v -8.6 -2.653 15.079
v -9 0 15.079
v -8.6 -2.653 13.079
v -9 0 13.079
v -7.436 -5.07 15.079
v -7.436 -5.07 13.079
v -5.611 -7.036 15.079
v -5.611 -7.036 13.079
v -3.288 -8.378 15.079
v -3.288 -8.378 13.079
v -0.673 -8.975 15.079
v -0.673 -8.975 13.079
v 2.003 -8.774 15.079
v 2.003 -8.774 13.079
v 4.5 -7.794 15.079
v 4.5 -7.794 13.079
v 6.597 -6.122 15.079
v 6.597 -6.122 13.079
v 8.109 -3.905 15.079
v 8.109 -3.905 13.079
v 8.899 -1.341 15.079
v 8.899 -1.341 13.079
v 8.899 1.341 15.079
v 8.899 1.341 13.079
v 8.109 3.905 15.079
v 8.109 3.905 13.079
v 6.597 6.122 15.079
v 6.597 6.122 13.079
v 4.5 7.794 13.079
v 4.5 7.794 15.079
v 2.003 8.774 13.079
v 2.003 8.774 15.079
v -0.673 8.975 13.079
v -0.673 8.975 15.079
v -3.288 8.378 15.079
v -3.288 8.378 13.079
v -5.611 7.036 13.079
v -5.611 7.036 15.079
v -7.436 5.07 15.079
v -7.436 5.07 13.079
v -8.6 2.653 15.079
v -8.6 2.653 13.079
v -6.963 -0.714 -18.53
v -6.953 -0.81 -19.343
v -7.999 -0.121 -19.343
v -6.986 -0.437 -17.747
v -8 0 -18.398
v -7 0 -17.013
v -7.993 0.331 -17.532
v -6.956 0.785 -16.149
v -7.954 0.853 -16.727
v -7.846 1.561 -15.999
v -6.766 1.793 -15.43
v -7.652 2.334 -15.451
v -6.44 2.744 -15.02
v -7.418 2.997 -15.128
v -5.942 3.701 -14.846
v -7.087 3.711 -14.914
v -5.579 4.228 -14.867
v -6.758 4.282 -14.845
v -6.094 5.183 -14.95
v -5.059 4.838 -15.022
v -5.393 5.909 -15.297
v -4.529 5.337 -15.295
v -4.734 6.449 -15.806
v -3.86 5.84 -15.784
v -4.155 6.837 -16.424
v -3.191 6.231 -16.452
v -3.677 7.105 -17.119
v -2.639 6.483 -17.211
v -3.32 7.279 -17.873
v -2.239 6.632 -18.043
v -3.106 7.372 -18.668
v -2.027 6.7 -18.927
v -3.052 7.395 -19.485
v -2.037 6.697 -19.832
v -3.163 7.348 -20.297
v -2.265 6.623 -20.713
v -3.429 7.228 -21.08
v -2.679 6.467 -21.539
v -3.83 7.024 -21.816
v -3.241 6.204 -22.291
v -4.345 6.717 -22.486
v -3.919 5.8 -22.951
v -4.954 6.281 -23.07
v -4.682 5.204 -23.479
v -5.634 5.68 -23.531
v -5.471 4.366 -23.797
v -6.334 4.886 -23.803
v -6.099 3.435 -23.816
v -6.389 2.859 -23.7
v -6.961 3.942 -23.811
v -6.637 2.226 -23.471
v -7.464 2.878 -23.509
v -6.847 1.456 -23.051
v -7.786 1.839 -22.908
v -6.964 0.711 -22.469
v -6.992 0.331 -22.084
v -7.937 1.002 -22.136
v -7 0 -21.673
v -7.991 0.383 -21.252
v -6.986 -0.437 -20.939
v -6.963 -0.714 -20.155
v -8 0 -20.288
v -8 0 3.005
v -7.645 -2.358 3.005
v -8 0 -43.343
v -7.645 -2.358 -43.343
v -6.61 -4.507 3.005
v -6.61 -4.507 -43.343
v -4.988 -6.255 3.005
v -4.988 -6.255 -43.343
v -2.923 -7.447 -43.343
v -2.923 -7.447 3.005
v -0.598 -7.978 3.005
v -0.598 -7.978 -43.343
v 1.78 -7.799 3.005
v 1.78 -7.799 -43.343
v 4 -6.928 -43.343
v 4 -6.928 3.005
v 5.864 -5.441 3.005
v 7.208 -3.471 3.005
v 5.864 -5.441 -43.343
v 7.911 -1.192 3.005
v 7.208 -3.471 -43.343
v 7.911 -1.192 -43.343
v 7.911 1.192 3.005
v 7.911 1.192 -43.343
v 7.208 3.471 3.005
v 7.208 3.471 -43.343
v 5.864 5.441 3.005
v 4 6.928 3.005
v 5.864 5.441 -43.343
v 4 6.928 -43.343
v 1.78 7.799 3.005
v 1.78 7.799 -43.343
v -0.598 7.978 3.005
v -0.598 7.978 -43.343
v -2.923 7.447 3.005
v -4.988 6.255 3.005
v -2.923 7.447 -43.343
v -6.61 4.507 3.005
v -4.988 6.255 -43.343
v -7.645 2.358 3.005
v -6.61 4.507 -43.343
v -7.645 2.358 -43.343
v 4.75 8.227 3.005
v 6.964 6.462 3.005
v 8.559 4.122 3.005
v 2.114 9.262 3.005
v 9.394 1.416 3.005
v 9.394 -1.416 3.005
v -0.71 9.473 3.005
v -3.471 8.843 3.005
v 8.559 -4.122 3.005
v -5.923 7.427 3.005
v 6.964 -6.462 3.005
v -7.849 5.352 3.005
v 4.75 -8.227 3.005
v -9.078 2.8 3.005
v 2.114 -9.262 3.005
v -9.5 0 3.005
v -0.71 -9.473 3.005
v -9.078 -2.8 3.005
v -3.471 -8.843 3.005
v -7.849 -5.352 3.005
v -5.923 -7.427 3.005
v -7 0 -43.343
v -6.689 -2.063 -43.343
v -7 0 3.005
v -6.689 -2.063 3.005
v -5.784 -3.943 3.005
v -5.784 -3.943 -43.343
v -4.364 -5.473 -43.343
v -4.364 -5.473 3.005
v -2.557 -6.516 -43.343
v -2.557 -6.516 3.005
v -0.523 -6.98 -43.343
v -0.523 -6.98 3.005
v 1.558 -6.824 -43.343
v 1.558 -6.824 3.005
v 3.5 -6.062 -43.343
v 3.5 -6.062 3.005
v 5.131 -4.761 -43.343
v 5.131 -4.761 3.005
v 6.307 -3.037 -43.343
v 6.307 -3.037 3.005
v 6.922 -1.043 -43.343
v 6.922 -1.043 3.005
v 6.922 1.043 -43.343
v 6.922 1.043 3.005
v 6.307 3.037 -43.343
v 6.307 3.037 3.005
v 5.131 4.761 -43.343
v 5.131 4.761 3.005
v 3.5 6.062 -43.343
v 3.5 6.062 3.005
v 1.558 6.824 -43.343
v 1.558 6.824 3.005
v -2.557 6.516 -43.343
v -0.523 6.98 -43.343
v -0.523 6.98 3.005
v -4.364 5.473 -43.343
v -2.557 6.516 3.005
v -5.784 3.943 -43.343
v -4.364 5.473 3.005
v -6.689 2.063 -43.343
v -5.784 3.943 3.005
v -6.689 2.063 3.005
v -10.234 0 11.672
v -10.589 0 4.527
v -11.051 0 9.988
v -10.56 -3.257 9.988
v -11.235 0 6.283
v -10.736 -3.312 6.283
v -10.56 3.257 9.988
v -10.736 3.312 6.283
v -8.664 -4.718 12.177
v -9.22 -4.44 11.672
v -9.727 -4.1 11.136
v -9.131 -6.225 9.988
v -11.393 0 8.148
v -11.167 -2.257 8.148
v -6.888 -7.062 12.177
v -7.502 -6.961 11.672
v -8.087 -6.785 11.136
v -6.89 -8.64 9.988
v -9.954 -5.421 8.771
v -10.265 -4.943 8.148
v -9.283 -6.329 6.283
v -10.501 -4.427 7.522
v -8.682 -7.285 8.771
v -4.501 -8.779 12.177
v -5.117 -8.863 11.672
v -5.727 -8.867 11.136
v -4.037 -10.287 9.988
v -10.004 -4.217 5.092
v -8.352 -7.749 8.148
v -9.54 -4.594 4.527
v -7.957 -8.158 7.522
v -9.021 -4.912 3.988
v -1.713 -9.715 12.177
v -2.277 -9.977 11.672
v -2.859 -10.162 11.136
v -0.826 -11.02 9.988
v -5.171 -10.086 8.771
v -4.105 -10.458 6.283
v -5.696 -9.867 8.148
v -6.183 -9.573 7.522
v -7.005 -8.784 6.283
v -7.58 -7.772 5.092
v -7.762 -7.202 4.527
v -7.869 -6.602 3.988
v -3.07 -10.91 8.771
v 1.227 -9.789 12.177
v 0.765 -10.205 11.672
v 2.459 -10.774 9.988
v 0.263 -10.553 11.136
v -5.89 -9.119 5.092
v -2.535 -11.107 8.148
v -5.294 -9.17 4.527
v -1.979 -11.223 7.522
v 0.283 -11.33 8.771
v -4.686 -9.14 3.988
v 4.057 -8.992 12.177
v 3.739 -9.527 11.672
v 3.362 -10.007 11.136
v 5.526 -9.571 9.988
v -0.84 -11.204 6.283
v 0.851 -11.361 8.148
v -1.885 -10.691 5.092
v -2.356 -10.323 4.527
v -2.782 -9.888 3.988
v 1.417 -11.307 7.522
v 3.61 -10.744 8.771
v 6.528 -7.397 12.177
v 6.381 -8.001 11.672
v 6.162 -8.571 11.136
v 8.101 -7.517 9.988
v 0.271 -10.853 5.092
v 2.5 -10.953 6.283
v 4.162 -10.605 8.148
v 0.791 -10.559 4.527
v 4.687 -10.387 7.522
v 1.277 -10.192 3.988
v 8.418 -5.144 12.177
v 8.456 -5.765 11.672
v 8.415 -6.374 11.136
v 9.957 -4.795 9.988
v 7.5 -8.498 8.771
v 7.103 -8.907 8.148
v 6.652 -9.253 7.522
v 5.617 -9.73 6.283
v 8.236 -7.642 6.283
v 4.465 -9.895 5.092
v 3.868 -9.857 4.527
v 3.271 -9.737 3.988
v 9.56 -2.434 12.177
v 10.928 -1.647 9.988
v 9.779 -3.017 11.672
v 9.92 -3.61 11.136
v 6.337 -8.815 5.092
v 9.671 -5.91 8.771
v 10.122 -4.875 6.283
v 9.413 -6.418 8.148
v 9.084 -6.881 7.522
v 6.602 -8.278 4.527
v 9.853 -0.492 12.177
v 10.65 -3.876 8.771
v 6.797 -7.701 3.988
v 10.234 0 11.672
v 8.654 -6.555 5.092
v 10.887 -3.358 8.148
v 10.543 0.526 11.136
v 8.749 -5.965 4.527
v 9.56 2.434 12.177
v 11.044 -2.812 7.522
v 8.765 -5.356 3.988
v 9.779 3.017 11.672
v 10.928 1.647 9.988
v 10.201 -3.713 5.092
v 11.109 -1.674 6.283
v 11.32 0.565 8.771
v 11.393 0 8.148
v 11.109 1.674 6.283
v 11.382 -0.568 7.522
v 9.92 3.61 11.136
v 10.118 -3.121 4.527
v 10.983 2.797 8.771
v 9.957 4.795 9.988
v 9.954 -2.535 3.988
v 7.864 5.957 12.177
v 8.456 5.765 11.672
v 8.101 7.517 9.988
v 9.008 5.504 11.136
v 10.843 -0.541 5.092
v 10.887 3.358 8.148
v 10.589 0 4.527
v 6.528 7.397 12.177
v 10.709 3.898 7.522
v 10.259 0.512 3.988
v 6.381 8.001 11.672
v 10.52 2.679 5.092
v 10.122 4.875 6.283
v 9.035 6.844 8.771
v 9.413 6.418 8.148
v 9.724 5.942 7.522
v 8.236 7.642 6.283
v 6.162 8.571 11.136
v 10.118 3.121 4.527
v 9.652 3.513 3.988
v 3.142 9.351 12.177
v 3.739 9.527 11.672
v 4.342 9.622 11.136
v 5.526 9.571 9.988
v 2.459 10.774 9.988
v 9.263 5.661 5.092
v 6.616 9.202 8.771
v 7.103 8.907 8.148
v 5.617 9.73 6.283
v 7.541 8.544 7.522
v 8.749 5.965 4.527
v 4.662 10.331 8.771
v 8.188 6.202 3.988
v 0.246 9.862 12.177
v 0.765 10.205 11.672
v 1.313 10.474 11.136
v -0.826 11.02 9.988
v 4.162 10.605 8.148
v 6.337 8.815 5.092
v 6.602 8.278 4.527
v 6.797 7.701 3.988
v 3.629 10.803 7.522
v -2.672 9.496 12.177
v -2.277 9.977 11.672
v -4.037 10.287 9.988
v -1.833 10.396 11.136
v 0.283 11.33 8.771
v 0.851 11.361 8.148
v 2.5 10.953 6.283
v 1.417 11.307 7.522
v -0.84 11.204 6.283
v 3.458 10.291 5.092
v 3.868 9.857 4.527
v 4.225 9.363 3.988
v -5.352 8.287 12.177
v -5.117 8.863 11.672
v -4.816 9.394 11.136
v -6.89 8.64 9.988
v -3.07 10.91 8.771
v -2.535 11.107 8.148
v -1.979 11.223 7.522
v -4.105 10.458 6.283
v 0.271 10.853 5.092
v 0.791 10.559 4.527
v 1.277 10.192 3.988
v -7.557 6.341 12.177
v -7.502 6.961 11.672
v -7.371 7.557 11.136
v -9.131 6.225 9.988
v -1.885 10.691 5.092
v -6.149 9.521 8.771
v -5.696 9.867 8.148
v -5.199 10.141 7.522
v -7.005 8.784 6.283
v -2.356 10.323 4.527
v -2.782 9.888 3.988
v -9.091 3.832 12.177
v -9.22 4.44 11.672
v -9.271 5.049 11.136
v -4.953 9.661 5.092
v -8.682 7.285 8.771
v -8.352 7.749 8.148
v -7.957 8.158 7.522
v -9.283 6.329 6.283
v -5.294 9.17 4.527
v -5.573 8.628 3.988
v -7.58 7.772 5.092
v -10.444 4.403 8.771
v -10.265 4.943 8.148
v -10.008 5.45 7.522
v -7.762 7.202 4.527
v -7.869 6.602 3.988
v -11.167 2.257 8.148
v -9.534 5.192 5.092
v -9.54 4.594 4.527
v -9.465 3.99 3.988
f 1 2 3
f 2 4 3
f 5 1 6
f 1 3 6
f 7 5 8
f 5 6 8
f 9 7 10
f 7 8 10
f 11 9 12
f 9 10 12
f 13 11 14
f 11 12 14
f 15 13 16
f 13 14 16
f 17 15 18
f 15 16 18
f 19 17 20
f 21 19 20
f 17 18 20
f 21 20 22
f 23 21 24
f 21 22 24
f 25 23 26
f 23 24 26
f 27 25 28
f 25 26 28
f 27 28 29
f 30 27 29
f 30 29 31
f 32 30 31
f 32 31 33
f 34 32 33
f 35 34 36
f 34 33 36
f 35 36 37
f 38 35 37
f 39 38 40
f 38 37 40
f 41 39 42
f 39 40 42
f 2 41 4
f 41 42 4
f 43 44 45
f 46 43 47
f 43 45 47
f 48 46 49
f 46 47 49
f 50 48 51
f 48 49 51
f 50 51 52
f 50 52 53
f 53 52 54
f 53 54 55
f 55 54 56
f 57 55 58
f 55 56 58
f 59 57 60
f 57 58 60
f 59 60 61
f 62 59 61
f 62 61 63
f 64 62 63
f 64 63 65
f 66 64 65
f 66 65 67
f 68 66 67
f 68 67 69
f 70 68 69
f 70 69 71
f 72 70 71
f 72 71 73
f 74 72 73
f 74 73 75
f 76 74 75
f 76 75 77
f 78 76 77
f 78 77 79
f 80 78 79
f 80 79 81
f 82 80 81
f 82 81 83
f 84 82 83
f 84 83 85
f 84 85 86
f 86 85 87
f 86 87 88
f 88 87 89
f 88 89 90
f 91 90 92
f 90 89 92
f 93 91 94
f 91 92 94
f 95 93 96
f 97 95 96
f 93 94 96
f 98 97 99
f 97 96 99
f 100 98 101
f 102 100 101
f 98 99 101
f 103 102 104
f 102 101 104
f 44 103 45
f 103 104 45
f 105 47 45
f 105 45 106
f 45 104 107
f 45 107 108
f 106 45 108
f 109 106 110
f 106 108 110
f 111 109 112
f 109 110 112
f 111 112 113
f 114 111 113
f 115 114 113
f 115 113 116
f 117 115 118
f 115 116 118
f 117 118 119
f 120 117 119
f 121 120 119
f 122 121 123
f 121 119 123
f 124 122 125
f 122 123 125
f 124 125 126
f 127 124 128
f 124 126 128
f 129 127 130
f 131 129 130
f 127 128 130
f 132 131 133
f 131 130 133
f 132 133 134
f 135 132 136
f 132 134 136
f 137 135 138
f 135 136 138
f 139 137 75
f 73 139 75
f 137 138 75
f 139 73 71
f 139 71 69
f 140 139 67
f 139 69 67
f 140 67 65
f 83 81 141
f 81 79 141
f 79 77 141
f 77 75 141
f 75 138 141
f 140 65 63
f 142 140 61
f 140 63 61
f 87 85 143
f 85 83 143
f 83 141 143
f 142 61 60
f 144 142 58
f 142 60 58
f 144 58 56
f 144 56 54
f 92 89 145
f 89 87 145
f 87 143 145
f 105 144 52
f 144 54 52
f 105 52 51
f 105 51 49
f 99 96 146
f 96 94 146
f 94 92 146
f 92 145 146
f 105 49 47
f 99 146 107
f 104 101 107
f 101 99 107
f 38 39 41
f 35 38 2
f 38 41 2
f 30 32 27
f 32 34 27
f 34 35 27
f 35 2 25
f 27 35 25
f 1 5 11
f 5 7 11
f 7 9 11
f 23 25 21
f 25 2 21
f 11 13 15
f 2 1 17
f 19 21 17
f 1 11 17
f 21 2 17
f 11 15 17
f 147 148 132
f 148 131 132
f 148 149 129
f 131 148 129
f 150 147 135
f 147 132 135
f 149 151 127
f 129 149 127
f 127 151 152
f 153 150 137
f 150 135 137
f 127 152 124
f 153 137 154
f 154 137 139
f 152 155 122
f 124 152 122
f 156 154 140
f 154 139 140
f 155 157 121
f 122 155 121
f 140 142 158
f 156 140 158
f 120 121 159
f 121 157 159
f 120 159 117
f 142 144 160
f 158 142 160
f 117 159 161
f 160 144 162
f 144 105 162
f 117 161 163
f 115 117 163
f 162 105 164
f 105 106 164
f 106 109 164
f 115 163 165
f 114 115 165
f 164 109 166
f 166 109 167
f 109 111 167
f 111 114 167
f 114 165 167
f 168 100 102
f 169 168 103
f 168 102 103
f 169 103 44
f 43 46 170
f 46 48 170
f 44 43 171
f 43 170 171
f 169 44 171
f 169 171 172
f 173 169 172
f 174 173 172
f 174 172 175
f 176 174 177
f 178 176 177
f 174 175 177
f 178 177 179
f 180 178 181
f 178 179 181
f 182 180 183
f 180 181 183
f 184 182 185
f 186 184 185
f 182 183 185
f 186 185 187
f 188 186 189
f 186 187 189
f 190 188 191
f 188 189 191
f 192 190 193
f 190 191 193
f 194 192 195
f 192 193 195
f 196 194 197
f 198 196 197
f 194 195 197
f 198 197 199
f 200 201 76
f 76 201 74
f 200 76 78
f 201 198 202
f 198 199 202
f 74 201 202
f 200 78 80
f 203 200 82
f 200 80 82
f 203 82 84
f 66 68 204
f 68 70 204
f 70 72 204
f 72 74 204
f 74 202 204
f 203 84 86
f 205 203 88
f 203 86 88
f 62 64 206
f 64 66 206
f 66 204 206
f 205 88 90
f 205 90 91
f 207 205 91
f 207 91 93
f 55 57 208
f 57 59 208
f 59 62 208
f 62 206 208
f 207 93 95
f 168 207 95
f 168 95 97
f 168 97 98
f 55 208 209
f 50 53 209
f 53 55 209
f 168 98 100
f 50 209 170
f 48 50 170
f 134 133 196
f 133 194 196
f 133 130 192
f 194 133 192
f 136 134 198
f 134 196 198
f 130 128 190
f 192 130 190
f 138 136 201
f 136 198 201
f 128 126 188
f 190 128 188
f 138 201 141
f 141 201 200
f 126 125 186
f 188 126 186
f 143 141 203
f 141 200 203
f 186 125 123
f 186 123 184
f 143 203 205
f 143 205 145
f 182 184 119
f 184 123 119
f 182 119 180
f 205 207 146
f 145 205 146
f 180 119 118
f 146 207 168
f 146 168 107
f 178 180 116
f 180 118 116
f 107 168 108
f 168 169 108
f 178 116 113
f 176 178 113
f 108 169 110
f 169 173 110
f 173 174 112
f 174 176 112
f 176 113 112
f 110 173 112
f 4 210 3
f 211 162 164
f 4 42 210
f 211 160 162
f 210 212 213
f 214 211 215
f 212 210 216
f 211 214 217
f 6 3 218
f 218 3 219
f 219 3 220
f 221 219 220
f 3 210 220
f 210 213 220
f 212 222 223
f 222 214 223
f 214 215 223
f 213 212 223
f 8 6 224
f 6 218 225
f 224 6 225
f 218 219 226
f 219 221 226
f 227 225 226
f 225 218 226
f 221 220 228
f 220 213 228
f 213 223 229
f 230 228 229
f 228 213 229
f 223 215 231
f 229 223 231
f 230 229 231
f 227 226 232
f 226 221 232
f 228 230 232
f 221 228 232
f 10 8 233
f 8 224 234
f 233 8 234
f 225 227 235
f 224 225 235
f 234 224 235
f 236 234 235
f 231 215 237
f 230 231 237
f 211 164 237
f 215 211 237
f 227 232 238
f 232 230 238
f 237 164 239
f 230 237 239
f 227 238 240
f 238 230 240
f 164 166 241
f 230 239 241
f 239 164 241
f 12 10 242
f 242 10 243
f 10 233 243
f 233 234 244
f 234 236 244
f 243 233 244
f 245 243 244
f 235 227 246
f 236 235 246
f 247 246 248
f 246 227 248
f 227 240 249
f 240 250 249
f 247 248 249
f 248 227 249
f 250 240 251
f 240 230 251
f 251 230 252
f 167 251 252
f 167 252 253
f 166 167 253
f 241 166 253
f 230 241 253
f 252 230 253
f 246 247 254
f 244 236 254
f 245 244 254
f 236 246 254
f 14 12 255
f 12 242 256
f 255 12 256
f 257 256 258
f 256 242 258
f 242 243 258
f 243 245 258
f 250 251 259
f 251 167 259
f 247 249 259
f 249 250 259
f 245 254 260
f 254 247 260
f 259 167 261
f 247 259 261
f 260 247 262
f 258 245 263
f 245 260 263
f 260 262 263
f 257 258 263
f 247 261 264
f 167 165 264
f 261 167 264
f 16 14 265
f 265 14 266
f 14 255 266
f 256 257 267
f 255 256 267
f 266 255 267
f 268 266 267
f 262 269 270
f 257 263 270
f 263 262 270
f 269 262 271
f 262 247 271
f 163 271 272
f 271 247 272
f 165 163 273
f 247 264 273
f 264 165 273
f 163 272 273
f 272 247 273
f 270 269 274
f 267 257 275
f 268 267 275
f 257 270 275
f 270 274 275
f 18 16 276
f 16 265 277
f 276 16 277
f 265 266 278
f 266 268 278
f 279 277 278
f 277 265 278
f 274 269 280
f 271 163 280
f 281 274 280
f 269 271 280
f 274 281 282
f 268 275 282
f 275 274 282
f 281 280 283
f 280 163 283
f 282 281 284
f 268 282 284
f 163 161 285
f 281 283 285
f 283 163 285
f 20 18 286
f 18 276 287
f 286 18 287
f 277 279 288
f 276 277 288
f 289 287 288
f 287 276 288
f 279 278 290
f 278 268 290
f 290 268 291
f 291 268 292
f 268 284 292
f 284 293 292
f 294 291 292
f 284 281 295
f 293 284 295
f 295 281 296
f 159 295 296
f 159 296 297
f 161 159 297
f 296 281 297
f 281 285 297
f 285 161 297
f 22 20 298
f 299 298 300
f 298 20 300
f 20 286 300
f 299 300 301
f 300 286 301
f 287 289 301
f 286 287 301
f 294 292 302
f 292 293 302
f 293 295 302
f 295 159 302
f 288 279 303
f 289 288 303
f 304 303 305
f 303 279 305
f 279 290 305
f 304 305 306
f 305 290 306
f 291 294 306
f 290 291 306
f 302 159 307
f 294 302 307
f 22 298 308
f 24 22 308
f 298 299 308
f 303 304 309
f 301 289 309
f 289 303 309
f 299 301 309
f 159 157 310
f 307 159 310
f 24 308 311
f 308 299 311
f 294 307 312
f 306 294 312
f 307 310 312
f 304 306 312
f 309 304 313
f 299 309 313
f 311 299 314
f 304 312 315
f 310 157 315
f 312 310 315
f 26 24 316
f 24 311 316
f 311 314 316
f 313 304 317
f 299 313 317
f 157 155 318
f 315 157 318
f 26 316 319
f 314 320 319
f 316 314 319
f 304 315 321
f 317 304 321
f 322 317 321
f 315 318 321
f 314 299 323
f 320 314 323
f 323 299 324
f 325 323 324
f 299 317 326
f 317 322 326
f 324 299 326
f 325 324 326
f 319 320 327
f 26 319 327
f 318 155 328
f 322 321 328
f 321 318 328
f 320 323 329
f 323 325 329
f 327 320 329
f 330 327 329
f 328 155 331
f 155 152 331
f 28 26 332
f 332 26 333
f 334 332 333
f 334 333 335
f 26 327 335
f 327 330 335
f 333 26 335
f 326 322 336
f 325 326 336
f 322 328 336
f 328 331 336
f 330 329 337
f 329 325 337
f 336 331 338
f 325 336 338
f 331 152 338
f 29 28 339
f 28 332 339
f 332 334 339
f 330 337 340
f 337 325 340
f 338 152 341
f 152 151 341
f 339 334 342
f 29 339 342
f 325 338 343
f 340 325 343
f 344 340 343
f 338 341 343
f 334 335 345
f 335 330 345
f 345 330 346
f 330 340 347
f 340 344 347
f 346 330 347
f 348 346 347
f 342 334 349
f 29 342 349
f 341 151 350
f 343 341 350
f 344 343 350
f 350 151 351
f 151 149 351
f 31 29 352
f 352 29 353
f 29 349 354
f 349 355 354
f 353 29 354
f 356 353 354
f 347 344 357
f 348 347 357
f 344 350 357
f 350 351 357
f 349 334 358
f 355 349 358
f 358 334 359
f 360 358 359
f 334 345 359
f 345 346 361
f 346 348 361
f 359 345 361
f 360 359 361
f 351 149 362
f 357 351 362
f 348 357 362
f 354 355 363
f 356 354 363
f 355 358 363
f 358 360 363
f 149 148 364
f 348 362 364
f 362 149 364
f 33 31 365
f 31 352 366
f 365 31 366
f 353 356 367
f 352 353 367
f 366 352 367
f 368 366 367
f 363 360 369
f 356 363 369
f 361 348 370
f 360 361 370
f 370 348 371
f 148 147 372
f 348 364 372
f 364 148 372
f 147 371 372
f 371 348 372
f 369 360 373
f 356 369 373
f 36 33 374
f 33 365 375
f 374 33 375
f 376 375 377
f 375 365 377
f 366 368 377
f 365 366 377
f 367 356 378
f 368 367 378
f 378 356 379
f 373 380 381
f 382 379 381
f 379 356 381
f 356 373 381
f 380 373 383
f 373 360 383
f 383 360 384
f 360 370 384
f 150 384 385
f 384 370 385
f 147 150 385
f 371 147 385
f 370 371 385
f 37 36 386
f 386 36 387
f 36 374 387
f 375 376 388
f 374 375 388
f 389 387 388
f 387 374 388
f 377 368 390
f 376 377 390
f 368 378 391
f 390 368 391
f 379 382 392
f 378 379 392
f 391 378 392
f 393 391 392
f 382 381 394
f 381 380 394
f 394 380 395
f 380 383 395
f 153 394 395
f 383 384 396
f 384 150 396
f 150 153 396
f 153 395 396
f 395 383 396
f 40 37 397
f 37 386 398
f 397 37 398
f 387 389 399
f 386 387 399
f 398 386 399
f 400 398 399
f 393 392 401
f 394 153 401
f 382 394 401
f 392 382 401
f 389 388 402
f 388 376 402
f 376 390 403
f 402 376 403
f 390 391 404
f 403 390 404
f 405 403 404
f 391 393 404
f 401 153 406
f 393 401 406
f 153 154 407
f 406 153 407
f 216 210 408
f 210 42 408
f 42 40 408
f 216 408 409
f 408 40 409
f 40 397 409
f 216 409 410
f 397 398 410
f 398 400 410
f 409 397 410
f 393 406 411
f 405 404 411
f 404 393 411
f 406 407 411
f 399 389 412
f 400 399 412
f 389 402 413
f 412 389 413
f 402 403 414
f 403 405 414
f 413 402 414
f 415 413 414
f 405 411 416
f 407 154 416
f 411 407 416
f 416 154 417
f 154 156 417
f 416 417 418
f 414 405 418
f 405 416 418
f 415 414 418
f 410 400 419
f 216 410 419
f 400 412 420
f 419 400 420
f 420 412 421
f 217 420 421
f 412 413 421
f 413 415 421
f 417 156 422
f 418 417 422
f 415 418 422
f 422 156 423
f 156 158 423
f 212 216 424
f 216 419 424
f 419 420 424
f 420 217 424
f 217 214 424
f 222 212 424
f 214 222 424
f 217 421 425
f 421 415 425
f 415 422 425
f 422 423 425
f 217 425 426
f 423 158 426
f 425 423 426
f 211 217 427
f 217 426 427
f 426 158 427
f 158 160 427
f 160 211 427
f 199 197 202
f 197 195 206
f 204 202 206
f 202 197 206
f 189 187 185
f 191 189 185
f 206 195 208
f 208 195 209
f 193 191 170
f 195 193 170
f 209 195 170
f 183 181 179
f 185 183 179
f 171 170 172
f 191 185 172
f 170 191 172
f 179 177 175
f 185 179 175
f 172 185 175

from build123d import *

# Parameters (mm, degrees)
TROU_DE_PASSAGE_D_AXE_3_321_REACH  = 43.97
TROU_DE_PASSAGE_D_AXE_3_321_BORE_R = 4.5


with BuildPart() as part:
    # Esquisse2 → Révolution1 (revolve)
    with BuildSketch(Plane(origin=(0, 0, 0), x_dir=(1, 0, 0), z_dir=(0, 1, 0)), mode=Mode.PRIVATE) as r_volution1_sk:
        with BuildLine():
            Line((7, 43.342725136), (7, -3.004612909))
            Line((7, -3.004612909), (0, -3.004612909))
            Line((0, -3.004612909), (0, -12.657274864))
            Line((0, -12.657274864), (0, -15.078606198))
            Line((0, -15.078606198), (9, -15.078606198))
            Line((9, -15.078606198), (9, -13.078606198))
            ThreePointArc((9, -13.078606198), (11.39286281, -8.14796573), (9.5, -3.004612909))
            Line((9.5, -3.004612909), (8, -3.004612909))
            Line((8, -3.004612909), (8, 43.342725136))
            Line((8, 43.342725136), (7, 43.342725136))
        make_face()
    revolve(r_volution1_sk.sketch.rotate(Axis((0, 0, -12.780225136), (0, 0, 1)), 180), axis=Axis((0, 0, -12.780225136), (0, 0, 1)))

    # Trou de passage d'axe 3/321 bore (on position points) → Trou de passage d'axe 3/321 (cut, up to next)
    with BuildSketch(Plane(origin=(-6.681517016, 4.399696622, -19.342725136), x_dir=(-0.549962077733, -0.835189627005, 0), z_dir=(-0.835189627005, 0.549962077733, 0)), mode=Mode.PRIVATE) as trou_de_passage_d_axe_3_321_sk1:
        Circle(TROU_DE_PASSAGE_D_AXE_3_321_BORE_R)
    trou_de_passage_d_axe_3_321_tool1 = extrude(trou_de_passage_d_axe_3_321_sk1.sketch, amount=-TROU_DE_PASSAGE_D_AXE_3_321_REACH, mode=Mode.PRIVATE) & part.part
    add(trou_de_passage_d_axe_3_321_tool1.solids().sort_by_distance((-6.681517, 4.399697, -19.342725))[0], mode=Mode.SUBTRACT)


solid = part.part
